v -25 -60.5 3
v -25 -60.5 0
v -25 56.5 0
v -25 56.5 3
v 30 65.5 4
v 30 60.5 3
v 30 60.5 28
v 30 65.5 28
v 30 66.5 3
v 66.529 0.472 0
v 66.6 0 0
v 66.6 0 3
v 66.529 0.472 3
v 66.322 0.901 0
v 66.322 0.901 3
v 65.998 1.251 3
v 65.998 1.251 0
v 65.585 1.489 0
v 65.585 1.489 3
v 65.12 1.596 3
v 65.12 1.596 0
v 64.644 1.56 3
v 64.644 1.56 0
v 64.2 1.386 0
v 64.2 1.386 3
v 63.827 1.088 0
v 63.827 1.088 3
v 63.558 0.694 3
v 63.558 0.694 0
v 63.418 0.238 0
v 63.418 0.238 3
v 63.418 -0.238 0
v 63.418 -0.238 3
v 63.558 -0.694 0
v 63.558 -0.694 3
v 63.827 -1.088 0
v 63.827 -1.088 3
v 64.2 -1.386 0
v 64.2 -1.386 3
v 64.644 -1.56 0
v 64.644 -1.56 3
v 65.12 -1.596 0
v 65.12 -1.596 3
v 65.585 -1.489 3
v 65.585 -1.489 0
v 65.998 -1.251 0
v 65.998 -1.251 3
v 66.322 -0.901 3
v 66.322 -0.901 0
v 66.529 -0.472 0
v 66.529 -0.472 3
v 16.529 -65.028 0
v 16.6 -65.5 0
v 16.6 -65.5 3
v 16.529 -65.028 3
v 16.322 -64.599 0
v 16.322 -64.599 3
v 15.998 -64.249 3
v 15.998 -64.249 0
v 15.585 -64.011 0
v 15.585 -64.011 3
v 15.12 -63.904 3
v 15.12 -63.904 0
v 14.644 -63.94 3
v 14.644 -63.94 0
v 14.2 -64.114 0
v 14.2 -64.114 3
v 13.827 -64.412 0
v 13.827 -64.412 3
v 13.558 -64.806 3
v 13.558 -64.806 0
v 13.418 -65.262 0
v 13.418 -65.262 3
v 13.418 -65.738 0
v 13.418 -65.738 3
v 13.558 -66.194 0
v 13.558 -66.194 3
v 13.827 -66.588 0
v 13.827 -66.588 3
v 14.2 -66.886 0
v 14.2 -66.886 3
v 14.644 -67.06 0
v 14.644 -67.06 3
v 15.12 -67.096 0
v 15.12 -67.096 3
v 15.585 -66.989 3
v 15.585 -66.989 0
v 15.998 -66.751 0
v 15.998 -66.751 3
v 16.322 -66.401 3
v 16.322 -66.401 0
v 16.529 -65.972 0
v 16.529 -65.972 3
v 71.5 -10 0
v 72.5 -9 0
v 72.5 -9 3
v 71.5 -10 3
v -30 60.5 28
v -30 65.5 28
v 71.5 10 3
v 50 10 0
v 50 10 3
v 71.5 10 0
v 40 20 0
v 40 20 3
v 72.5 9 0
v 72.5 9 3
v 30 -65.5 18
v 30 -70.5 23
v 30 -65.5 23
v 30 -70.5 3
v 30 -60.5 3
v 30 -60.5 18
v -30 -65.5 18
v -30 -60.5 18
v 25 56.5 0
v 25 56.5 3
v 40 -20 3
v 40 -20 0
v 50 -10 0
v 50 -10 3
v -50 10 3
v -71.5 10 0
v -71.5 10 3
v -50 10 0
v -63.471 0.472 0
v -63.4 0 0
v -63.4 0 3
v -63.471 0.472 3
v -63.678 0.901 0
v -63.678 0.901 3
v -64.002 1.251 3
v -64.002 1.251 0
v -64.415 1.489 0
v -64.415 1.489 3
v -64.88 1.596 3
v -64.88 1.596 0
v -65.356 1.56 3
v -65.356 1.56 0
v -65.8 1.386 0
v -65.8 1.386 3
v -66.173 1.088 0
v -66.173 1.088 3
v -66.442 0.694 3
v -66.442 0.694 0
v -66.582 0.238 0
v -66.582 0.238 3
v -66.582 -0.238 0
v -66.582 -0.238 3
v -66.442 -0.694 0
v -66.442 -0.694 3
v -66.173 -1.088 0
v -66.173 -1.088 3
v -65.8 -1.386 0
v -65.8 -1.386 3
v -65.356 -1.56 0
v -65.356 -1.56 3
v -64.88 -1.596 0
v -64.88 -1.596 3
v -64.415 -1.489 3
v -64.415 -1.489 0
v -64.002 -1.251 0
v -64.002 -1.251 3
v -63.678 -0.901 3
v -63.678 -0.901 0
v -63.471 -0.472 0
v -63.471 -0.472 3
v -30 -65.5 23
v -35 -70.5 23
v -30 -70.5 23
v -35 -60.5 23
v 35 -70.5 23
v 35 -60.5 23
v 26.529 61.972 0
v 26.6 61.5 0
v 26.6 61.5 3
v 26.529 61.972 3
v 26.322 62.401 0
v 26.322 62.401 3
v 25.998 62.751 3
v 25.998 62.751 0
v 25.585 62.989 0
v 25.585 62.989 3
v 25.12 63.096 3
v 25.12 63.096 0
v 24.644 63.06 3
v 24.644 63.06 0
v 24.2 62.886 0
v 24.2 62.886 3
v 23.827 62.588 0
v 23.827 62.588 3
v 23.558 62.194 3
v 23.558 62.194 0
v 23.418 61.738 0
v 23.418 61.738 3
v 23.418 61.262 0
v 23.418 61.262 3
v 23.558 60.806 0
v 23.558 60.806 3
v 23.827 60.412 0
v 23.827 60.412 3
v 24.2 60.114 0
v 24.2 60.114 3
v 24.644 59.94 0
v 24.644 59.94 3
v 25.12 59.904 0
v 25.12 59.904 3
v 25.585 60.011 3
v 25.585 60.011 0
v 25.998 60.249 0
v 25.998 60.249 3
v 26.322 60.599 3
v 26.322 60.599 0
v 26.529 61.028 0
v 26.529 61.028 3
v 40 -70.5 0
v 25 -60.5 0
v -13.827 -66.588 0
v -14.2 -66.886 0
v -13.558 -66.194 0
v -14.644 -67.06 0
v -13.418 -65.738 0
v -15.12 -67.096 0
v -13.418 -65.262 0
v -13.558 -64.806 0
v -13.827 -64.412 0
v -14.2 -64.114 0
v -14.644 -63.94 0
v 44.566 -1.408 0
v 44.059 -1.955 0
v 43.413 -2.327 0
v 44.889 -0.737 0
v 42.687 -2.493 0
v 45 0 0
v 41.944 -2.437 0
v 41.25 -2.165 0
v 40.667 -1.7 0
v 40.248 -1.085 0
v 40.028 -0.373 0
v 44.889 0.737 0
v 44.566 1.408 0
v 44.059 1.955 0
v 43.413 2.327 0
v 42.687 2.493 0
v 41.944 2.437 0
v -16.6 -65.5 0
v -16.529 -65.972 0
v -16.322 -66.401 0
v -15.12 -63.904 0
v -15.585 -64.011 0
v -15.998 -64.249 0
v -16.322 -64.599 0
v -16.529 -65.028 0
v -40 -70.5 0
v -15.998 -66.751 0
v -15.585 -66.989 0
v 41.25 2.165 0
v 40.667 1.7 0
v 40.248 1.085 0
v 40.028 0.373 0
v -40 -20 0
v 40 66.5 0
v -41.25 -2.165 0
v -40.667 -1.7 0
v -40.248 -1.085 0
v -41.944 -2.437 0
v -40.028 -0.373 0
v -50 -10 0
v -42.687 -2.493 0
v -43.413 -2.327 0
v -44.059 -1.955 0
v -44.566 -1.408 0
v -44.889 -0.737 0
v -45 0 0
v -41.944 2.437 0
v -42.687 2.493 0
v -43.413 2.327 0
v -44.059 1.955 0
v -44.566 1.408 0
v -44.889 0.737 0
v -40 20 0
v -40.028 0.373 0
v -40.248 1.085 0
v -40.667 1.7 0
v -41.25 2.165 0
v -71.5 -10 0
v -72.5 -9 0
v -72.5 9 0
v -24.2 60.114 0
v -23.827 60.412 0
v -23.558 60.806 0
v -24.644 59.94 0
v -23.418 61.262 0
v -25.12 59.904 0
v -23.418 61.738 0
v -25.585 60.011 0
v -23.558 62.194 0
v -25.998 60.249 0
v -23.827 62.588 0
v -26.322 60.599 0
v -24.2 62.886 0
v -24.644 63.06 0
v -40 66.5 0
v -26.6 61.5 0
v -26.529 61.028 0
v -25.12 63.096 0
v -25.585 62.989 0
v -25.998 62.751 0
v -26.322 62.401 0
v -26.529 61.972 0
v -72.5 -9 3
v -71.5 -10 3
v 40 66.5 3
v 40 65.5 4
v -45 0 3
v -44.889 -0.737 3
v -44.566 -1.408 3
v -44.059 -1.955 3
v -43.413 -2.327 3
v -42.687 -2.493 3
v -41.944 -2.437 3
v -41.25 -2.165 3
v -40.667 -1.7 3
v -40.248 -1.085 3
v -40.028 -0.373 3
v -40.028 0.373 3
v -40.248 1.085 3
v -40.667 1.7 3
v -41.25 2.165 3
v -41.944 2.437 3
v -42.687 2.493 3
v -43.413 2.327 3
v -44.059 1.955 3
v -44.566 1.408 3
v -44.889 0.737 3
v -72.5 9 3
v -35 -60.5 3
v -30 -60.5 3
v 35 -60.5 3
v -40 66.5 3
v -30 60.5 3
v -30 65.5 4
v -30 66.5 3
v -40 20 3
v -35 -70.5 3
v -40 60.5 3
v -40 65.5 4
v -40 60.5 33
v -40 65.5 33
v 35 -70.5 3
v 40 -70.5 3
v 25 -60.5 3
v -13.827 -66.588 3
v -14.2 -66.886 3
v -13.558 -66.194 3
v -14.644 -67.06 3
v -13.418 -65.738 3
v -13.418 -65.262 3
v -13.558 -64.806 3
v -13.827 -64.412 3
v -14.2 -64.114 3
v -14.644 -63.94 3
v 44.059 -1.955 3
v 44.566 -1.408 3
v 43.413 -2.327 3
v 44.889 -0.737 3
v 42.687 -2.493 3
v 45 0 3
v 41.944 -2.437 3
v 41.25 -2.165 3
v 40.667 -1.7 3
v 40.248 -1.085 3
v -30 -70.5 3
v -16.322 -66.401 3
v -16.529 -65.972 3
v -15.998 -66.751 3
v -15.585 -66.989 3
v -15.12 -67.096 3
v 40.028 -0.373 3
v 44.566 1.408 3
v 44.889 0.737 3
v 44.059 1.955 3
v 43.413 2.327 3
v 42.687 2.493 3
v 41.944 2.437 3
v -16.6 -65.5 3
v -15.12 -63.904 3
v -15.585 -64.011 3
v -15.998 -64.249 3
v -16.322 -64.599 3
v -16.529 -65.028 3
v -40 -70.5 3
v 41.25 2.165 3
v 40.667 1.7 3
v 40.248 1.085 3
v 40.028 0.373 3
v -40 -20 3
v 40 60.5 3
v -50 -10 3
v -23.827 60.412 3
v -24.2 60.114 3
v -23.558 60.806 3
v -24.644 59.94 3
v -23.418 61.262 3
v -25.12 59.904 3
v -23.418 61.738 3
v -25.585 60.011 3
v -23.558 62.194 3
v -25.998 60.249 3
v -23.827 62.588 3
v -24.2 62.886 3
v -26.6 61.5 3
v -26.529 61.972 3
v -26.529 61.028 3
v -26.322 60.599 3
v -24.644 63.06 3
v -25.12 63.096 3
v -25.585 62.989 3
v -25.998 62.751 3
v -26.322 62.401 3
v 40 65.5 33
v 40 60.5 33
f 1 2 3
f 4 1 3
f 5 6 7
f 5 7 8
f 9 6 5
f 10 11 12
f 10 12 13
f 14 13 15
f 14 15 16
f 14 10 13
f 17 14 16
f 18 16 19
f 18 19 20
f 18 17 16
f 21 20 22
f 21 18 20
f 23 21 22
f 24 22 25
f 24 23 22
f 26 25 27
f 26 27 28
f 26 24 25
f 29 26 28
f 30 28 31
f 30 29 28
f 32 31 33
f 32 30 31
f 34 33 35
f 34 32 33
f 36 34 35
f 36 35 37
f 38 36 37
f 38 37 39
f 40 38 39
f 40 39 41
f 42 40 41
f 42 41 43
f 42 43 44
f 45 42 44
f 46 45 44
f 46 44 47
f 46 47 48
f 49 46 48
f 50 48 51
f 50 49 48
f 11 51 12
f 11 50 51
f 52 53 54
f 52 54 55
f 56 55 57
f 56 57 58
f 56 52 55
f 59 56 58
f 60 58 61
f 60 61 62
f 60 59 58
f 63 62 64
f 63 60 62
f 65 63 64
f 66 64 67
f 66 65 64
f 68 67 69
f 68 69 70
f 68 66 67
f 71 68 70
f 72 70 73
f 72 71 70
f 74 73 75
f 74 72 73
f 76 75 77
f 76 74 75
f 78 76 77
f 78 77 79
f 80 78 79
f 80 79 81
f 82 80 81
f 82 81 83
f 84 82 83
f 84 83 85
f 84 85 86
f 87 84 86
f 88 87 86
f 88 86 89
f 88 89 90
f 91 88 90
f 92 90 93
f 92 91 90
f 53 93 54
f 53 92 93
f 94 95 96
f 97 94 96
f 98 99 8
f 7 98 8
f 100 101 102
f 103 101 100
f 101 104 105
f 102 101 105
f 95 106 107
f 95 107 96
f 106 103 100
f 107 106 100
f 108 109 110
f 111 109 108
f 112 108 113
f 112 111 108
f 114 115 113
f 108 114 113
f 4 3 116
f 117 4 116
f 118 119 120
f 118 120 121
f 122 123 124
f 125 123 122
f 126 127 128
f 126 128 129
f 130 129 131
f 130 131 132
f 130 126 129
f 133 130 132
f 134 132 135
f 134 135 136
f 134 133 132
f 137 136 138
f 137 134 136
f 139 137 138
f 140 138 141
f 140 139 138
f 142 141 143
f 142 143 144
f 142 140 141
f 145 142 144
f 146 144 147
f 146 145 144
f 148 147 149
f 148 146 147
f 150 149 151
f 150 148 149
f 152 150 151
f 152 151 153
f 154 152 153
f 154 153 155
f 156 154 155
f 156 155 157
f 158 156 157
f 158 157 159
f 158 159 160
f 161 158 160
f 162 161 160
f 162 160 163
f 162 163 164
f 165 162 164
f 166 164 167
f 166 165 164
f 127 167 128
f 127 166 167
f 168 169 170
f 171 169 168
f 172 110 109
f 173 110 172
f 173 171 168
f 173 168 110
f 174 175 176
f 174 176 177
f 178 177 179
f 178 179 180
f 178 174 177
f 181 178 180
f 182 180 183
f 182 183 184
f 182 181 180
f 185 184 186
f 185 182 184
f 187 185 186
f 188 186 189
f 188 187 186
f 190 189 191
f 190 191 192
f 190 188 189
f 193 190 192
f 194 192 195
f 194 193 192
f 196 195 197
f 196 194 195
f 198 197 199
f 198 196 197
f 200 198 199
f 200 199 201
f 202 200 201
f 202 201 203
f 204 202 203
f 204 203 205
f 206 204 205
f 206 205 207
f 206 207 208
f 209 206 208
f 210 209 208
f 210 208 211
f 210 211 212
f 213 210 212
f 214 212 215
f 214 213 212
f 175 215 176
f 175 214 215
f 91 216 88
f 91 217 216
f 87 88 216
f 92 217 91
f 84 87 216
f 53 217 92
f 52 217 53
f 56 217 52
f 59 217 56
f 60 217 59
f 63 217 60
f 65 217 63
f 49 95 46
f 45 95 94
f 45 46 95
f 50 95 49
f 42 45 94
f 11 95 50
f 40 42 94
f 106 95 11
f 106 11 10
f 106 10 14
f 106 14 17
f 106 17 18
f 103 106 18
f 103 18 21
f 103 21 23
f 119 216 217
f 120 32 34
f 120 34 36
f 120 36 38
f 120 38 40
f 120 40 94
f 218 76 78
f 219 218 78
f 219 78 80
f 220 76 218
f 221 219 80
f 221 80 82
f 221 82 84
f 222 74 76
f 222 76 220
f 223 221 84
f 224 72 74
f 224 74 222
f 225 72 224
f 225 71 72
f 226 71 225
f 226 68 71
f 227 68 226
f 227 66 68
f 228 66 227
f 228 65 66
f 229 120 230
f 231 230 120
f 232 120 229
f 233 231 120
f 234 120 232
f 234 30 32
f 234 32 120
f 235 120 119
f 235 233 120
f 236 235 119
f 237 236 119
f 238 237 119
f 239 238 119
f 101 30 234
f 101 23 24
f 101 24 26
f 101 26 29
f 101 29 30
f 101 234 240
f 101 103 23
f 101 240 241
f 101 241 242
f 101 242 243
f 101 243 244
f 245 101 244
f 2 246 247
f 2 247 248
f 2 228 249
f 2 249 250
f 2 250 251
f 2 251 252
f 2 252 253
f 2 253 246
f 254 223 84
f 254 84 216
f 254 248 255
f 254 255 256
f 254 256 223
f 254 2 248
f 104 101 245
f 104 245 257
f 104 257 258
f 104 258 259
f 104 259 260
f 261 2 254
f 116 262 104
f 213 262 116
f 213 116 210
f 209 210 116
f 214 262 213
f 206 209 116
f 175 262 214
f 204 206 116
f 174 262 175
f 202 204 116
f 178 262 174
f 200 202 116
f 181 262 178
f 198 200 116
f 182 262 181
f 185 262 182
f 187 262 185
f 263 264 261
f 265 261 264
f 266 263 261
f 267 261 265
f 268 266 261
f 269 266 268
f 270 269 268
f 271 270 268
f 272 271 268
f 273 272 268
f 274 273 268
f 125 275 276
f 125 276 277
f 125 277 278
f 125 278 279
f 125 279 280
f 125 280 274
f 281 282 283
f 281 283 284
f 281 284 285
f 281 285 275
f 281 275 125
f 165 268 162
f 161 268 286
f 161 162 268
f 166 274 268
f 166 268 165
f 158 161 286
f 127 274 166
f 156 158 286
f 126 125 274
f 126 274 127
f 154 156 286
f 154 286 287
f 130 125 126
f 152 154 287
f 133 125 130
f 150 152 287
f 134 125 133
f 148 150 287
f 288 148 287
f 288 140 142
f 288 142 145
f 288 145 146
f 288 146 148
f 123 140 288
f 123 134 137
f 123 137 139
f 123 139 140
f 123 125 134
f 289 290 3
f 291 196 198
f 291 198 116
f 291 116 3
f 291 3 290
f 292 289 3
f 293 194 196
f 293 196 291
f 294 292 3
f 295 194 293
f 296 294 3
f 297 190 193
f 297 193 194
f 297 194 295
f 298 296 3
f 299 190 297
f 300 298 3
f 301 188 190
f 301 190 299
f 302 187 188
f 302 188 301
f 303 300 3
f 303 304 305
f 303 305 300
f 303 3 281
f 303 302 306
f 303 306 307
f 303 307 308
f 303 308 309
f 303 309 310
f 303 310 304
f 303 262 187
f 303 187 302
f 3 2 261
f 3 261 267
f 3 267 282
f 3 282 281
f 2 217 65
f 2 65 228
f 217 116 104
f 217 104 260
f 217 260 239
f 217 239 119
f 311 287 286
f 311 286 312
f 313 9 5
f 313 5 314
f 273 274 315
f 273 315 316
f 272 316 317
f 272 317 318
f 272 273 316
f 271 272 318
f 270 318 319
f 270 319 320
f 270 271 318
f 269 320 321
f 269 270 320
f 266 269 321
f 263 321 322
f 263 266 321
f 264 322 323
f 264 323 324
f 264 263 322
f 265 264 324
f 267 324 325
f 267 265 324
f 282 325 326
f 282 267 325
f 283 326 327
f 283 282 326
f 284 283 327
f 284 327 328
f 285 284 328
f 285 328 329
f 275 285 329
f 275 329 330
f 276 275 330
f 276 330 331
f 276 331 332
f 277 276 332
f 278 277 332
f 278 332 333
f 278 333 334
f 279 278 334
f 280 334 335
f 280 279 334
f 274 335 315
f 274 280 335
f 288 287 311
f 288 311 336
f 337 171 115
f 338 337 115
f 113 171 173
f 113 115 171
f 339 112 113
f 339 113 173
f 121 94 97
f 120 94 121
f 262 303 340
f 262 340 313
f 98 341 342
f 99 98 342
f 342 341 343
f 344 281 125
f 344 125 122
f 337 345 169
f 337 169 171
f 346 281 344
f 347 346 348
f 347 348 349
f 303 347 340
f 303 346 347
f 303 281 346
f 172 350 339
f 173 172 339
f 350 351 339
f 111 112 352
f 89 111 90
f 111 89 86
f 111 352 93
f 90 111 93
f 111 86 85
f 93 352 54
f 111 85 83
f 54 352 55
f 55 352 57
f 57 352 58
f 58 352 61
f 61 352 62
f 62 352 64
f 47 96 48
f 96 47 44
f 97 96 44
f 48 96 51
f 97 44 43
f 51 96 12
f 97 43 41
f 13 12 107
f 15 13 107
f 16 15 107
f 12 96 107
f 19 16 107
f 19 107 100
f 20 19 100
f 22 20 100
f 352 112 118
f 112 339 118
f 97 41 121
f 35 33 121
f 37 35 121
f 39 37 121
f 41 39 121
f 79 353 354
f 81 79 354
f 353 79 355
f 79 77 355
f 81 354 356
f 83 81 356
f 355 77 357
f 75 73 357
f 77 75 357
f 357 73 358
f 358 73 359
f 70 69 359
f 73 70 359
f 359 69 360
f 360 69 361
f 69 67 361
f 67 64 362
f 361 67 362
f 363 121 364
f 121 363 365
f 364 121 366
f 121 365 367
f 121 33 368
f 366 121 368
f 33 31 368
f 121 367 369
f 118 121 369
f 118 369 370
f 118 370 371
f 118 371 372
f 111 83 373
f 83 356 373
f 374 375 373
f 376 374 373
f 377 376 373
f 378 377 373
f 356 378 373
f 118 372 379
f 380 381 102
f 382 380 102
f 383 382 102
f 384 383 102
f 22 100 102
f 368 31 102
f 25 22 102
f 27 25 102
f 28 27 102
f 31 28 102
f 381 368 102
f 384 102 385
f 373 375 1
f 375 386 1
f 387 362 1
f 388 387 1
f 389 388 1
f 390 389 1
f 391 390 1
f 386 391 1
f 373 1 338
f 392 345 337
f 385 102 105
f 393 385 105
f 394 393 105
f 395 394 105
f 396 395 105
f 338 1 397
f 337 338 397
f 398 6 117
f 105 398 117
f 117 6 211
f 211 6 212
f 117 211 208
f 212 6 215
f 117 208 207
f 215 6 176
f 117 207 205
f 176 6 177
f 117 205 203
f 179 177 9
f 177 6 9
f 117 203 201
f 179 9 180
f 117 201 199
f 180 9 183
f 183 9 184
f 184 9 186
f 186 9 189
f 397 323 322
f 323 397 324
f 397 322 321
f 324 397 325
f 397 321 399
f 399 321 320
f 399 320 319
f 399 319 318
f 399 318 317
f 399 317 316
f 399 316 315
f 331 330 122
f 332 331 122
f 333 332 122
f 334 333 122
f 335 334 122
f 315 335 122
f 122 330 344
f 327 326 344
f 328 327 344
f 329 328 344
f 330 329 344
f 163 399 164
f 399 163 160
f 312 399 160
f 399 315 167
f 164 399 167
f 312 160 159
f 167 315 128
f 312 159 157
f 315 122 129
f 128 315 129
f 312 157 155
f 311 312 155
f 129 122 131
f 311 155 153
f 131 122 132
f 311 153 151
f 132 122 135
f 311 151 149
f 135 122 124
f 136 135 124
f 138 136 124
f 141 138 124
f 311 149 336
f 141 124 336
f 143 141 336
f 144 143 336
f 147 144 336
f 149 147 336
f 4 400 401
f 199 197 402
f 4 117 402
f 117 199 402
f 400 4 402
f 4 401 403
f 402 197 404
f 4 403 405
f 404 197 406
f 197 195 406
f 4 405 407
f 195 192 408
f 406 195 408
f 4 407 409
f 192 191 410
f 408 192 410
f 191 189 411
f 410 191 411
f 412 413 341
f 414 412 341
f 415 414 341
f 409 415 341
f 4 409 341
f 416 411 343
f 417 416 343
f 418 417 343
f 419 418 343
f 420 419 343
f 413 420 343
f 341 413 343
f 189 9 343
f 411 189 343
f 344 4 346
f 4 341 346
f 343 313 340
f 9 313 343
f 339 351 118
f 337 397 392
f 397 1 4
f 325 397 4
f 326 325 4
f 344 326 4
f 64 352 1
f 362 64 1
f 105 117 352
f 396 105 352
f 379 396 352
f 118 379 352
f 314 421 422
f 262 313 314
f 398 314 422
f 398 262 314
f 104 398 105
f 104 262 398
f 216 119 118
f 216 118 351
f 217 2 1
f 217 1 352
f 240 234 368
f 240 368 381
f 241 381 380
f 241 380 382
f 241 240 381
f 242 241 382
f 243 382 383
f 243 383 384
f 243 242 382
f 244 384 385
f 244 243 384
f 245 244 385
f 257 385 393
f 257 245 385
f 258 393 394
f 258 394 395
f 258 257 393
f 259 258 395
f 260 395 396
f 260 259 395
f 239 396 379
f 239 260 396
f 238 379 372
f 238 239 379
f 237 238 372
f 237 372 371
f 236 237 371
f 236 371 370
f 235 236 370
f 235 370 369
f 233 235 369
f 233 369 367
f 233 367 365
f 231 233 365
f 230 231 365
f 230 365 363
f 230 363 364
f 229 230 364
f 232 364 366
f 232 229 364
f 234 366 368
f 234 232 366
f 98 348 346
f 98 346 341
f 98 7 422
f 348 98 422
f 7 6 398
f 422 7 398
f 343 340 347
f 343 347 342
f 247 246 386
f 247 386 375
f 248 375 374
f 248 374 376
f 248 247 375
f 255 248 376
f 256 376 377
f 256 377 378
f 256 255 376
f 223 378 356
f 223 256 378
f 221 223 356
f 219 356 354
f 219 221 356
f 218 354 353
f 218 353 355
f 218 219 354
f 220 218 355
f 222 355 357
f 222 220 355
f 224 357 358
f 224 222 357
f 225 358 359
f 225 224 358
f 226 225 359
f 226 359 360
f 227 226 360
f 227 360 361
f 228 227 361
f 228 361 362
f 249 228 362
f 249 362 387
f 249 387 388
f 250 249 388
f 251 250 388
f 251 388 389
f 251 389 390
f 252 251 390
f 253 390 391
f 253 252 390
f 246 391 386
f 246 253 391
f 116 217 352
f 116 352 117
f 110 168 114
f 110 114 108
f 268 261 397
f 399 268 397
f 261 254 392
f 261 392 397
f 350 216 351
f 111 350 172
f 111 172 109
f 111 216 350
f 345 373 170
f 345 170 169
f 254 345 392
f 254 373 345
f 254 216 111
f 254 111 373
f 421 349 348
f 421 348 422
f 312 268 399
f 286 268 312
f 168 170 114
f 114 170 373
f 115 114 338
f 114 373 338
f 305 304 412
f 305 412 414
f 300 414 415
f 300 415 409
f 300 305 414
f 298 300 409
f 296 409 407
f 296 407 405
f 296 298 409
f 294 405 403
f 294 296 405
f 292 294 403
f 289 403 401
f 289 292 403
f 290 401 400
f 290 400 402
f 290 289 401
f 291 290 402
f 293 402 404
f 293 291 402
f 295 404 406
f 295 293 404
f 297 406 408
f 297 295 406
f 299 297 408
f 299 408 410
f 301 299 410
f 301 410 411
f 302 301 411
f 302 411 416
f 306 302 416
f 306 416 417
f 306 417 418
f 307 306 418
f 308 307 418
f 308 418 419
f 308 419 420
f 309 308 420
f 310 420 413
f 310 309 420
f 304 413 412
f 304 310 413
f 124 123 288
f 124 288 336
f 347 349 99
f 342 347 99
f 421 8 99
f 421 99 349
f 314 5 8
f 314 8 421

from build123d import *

# Parameters (mm, degrees)
SKETCH_9_R       = 1.6
SKETCH_9_R_2     = 2.5
SKETCH_9_W       = 50
SKETCH_9_H       = 117
EXTRUDE_7_DEPTH  = 3
SKETCH_10_W      = 10
SKETCH_10_H      = 5
EXTRUDE_8_DEPTH  = 30
SKETCH_11_W      = 5
SKETCH_11_H      = 10
EXTRUDE_9_DEPTH  = 20
SKETCH_12_W      = 80
SKETCH_12_H      = 5
EXTRUDE_10_DEPTH = 5
SKETCH_14_W      = 70
SKETCH_14_H      = 5
EXTRUDE_11_DEPTH = 5
CHAMFER_2_SIZE   = 1
CHAMFER_3_SIZE   = 10


with BuildPart() as part:
    # 草图9 → 凸台-拉伸7 (new body)
    with BuildSketch(Plane.XY):
        Polygon((-40, 66.5), (40, 66.5), (40, 10), (72.5, 10), (72.5, -10), (40, -10), (40, -70.5), (-40, -70.5), (-40, -10), (-72.5, -10), (-72.5, 10), (-40, 10), align=None)
        with Locations((25, 61.5)):
            Circle(SKETCH_9_R, mode=Mode.SUBTRACT)
        with Locations((15, -65.5)):
            Circle(SKETCH_9_R, mode=Mode.SUBTRACT)
        with Locations((42.5, 0)):
            Circle(SKETCH_9_R_2, mode=Mode.SUBTRACT)
        with Locations(Location((-42.5, 0, 0), (0, 0, 180))):
            Circle(SKETCH_9_R_2, mode=Mode.SUBTRACT)
        with Locations(Location((-15, -65.5, 0), (0, 0, 180))):
            Circle(SKETCH_9_R, mode=Mode.SUBTRACT)
        with Locations(Location((-25, 61.5, 0), (0, 0, 180))):
            Circle(SKETCH_9_R, mode=Mode.SUBTRACT)
        with Locations((-65, 0)):
            Circle(SKETCH_9_R, mode=Mode.SUBTRACT)
        with Locations((65, 0)):
            Circle(SKETCH_9_R, mode=Mode.SUBTRACT)
        with Locations((0, -2)):
            Rectangle(SKETCH_9_W, SKETCH_9_H, mode=Mode.SUBTRACT)
    extrude(amount=EXTRUDE_7_DEPTH)

    # 草图10 → 凸台-拉伸8 (add)
    with BuildSketch(Plane.XY.offset(3)):
        with Locations((-35, 63)):
            Rectangle(SKETCH_10_W, SKETCH_10_H)
        with Locations((35, 63)):
            Rectangle(SKETCH_10_W, SKETCH_10_H)
    extrude(amount=EXTRUDE_8_DEPTH)

    # 草图11 → 凸台-拉伸9 (add)
    with BuildSketch(Plane.XY.offset(3)):
        with Locations((-32.5, -65.5)):
            Rectangle(SKETCH_11_W, SKETCH_11_H)
        with Locations((32.5, -65.5)):
            Rectangle(SKETCH_11_W, SKETCH_11_H)
    extrude(amount=EXTRUDE_9_DEPTH)

    # 草图12 → 凸台-拉伸10 (add)
    with BuildSketch(Plane.XY.offset(33)):
        with Locations((0, 63)):
            Rectangle(SKETCH_12_W, SKETCH_12_H)
    extrude(amount=-EXTRUDE_10_DEPTH)

    # 草图14 → 凸台-拉伸11 (add)
    with BuildSketch(Plane.XY.offset(23)):
        with Locations((0, -63)):
            Rectangle(SKETCH_14_W, SKETCH_14_H)
    extrude(amount=-EXTRUDE_11_DEPTH)

    # 倒角2
    chamfer_2_edges = [part.edges().sort_by_distance(p)[0] for p in [
        (35, 65.5, 3),
        (-35, 65.5, 3),
        (72.5, -10, 1.5),
        (72.5, 10, 1.5),
        (-72.5, -10, 1.5),
        (-72.5, 10, 1.5),
    ]]
    chamfer(chamfer_2_edges, length=CHAMFER_2_SIZE - 0.0001)  # a hair under: the kernel refuses the full size

    # 倒角3
    chamfer_3_edges = [part.edges().sort_by_distance(p)[0] for p in [
        (40, 10, 1.5),
        (40, -10, 1.5),
        (-40, -10, 1.5),
        (-40, 10, 1.5),
    ]]
    chamfer(chamfer_3_edges, length=CHAMFER_3_SIZE)


solid = part.part
